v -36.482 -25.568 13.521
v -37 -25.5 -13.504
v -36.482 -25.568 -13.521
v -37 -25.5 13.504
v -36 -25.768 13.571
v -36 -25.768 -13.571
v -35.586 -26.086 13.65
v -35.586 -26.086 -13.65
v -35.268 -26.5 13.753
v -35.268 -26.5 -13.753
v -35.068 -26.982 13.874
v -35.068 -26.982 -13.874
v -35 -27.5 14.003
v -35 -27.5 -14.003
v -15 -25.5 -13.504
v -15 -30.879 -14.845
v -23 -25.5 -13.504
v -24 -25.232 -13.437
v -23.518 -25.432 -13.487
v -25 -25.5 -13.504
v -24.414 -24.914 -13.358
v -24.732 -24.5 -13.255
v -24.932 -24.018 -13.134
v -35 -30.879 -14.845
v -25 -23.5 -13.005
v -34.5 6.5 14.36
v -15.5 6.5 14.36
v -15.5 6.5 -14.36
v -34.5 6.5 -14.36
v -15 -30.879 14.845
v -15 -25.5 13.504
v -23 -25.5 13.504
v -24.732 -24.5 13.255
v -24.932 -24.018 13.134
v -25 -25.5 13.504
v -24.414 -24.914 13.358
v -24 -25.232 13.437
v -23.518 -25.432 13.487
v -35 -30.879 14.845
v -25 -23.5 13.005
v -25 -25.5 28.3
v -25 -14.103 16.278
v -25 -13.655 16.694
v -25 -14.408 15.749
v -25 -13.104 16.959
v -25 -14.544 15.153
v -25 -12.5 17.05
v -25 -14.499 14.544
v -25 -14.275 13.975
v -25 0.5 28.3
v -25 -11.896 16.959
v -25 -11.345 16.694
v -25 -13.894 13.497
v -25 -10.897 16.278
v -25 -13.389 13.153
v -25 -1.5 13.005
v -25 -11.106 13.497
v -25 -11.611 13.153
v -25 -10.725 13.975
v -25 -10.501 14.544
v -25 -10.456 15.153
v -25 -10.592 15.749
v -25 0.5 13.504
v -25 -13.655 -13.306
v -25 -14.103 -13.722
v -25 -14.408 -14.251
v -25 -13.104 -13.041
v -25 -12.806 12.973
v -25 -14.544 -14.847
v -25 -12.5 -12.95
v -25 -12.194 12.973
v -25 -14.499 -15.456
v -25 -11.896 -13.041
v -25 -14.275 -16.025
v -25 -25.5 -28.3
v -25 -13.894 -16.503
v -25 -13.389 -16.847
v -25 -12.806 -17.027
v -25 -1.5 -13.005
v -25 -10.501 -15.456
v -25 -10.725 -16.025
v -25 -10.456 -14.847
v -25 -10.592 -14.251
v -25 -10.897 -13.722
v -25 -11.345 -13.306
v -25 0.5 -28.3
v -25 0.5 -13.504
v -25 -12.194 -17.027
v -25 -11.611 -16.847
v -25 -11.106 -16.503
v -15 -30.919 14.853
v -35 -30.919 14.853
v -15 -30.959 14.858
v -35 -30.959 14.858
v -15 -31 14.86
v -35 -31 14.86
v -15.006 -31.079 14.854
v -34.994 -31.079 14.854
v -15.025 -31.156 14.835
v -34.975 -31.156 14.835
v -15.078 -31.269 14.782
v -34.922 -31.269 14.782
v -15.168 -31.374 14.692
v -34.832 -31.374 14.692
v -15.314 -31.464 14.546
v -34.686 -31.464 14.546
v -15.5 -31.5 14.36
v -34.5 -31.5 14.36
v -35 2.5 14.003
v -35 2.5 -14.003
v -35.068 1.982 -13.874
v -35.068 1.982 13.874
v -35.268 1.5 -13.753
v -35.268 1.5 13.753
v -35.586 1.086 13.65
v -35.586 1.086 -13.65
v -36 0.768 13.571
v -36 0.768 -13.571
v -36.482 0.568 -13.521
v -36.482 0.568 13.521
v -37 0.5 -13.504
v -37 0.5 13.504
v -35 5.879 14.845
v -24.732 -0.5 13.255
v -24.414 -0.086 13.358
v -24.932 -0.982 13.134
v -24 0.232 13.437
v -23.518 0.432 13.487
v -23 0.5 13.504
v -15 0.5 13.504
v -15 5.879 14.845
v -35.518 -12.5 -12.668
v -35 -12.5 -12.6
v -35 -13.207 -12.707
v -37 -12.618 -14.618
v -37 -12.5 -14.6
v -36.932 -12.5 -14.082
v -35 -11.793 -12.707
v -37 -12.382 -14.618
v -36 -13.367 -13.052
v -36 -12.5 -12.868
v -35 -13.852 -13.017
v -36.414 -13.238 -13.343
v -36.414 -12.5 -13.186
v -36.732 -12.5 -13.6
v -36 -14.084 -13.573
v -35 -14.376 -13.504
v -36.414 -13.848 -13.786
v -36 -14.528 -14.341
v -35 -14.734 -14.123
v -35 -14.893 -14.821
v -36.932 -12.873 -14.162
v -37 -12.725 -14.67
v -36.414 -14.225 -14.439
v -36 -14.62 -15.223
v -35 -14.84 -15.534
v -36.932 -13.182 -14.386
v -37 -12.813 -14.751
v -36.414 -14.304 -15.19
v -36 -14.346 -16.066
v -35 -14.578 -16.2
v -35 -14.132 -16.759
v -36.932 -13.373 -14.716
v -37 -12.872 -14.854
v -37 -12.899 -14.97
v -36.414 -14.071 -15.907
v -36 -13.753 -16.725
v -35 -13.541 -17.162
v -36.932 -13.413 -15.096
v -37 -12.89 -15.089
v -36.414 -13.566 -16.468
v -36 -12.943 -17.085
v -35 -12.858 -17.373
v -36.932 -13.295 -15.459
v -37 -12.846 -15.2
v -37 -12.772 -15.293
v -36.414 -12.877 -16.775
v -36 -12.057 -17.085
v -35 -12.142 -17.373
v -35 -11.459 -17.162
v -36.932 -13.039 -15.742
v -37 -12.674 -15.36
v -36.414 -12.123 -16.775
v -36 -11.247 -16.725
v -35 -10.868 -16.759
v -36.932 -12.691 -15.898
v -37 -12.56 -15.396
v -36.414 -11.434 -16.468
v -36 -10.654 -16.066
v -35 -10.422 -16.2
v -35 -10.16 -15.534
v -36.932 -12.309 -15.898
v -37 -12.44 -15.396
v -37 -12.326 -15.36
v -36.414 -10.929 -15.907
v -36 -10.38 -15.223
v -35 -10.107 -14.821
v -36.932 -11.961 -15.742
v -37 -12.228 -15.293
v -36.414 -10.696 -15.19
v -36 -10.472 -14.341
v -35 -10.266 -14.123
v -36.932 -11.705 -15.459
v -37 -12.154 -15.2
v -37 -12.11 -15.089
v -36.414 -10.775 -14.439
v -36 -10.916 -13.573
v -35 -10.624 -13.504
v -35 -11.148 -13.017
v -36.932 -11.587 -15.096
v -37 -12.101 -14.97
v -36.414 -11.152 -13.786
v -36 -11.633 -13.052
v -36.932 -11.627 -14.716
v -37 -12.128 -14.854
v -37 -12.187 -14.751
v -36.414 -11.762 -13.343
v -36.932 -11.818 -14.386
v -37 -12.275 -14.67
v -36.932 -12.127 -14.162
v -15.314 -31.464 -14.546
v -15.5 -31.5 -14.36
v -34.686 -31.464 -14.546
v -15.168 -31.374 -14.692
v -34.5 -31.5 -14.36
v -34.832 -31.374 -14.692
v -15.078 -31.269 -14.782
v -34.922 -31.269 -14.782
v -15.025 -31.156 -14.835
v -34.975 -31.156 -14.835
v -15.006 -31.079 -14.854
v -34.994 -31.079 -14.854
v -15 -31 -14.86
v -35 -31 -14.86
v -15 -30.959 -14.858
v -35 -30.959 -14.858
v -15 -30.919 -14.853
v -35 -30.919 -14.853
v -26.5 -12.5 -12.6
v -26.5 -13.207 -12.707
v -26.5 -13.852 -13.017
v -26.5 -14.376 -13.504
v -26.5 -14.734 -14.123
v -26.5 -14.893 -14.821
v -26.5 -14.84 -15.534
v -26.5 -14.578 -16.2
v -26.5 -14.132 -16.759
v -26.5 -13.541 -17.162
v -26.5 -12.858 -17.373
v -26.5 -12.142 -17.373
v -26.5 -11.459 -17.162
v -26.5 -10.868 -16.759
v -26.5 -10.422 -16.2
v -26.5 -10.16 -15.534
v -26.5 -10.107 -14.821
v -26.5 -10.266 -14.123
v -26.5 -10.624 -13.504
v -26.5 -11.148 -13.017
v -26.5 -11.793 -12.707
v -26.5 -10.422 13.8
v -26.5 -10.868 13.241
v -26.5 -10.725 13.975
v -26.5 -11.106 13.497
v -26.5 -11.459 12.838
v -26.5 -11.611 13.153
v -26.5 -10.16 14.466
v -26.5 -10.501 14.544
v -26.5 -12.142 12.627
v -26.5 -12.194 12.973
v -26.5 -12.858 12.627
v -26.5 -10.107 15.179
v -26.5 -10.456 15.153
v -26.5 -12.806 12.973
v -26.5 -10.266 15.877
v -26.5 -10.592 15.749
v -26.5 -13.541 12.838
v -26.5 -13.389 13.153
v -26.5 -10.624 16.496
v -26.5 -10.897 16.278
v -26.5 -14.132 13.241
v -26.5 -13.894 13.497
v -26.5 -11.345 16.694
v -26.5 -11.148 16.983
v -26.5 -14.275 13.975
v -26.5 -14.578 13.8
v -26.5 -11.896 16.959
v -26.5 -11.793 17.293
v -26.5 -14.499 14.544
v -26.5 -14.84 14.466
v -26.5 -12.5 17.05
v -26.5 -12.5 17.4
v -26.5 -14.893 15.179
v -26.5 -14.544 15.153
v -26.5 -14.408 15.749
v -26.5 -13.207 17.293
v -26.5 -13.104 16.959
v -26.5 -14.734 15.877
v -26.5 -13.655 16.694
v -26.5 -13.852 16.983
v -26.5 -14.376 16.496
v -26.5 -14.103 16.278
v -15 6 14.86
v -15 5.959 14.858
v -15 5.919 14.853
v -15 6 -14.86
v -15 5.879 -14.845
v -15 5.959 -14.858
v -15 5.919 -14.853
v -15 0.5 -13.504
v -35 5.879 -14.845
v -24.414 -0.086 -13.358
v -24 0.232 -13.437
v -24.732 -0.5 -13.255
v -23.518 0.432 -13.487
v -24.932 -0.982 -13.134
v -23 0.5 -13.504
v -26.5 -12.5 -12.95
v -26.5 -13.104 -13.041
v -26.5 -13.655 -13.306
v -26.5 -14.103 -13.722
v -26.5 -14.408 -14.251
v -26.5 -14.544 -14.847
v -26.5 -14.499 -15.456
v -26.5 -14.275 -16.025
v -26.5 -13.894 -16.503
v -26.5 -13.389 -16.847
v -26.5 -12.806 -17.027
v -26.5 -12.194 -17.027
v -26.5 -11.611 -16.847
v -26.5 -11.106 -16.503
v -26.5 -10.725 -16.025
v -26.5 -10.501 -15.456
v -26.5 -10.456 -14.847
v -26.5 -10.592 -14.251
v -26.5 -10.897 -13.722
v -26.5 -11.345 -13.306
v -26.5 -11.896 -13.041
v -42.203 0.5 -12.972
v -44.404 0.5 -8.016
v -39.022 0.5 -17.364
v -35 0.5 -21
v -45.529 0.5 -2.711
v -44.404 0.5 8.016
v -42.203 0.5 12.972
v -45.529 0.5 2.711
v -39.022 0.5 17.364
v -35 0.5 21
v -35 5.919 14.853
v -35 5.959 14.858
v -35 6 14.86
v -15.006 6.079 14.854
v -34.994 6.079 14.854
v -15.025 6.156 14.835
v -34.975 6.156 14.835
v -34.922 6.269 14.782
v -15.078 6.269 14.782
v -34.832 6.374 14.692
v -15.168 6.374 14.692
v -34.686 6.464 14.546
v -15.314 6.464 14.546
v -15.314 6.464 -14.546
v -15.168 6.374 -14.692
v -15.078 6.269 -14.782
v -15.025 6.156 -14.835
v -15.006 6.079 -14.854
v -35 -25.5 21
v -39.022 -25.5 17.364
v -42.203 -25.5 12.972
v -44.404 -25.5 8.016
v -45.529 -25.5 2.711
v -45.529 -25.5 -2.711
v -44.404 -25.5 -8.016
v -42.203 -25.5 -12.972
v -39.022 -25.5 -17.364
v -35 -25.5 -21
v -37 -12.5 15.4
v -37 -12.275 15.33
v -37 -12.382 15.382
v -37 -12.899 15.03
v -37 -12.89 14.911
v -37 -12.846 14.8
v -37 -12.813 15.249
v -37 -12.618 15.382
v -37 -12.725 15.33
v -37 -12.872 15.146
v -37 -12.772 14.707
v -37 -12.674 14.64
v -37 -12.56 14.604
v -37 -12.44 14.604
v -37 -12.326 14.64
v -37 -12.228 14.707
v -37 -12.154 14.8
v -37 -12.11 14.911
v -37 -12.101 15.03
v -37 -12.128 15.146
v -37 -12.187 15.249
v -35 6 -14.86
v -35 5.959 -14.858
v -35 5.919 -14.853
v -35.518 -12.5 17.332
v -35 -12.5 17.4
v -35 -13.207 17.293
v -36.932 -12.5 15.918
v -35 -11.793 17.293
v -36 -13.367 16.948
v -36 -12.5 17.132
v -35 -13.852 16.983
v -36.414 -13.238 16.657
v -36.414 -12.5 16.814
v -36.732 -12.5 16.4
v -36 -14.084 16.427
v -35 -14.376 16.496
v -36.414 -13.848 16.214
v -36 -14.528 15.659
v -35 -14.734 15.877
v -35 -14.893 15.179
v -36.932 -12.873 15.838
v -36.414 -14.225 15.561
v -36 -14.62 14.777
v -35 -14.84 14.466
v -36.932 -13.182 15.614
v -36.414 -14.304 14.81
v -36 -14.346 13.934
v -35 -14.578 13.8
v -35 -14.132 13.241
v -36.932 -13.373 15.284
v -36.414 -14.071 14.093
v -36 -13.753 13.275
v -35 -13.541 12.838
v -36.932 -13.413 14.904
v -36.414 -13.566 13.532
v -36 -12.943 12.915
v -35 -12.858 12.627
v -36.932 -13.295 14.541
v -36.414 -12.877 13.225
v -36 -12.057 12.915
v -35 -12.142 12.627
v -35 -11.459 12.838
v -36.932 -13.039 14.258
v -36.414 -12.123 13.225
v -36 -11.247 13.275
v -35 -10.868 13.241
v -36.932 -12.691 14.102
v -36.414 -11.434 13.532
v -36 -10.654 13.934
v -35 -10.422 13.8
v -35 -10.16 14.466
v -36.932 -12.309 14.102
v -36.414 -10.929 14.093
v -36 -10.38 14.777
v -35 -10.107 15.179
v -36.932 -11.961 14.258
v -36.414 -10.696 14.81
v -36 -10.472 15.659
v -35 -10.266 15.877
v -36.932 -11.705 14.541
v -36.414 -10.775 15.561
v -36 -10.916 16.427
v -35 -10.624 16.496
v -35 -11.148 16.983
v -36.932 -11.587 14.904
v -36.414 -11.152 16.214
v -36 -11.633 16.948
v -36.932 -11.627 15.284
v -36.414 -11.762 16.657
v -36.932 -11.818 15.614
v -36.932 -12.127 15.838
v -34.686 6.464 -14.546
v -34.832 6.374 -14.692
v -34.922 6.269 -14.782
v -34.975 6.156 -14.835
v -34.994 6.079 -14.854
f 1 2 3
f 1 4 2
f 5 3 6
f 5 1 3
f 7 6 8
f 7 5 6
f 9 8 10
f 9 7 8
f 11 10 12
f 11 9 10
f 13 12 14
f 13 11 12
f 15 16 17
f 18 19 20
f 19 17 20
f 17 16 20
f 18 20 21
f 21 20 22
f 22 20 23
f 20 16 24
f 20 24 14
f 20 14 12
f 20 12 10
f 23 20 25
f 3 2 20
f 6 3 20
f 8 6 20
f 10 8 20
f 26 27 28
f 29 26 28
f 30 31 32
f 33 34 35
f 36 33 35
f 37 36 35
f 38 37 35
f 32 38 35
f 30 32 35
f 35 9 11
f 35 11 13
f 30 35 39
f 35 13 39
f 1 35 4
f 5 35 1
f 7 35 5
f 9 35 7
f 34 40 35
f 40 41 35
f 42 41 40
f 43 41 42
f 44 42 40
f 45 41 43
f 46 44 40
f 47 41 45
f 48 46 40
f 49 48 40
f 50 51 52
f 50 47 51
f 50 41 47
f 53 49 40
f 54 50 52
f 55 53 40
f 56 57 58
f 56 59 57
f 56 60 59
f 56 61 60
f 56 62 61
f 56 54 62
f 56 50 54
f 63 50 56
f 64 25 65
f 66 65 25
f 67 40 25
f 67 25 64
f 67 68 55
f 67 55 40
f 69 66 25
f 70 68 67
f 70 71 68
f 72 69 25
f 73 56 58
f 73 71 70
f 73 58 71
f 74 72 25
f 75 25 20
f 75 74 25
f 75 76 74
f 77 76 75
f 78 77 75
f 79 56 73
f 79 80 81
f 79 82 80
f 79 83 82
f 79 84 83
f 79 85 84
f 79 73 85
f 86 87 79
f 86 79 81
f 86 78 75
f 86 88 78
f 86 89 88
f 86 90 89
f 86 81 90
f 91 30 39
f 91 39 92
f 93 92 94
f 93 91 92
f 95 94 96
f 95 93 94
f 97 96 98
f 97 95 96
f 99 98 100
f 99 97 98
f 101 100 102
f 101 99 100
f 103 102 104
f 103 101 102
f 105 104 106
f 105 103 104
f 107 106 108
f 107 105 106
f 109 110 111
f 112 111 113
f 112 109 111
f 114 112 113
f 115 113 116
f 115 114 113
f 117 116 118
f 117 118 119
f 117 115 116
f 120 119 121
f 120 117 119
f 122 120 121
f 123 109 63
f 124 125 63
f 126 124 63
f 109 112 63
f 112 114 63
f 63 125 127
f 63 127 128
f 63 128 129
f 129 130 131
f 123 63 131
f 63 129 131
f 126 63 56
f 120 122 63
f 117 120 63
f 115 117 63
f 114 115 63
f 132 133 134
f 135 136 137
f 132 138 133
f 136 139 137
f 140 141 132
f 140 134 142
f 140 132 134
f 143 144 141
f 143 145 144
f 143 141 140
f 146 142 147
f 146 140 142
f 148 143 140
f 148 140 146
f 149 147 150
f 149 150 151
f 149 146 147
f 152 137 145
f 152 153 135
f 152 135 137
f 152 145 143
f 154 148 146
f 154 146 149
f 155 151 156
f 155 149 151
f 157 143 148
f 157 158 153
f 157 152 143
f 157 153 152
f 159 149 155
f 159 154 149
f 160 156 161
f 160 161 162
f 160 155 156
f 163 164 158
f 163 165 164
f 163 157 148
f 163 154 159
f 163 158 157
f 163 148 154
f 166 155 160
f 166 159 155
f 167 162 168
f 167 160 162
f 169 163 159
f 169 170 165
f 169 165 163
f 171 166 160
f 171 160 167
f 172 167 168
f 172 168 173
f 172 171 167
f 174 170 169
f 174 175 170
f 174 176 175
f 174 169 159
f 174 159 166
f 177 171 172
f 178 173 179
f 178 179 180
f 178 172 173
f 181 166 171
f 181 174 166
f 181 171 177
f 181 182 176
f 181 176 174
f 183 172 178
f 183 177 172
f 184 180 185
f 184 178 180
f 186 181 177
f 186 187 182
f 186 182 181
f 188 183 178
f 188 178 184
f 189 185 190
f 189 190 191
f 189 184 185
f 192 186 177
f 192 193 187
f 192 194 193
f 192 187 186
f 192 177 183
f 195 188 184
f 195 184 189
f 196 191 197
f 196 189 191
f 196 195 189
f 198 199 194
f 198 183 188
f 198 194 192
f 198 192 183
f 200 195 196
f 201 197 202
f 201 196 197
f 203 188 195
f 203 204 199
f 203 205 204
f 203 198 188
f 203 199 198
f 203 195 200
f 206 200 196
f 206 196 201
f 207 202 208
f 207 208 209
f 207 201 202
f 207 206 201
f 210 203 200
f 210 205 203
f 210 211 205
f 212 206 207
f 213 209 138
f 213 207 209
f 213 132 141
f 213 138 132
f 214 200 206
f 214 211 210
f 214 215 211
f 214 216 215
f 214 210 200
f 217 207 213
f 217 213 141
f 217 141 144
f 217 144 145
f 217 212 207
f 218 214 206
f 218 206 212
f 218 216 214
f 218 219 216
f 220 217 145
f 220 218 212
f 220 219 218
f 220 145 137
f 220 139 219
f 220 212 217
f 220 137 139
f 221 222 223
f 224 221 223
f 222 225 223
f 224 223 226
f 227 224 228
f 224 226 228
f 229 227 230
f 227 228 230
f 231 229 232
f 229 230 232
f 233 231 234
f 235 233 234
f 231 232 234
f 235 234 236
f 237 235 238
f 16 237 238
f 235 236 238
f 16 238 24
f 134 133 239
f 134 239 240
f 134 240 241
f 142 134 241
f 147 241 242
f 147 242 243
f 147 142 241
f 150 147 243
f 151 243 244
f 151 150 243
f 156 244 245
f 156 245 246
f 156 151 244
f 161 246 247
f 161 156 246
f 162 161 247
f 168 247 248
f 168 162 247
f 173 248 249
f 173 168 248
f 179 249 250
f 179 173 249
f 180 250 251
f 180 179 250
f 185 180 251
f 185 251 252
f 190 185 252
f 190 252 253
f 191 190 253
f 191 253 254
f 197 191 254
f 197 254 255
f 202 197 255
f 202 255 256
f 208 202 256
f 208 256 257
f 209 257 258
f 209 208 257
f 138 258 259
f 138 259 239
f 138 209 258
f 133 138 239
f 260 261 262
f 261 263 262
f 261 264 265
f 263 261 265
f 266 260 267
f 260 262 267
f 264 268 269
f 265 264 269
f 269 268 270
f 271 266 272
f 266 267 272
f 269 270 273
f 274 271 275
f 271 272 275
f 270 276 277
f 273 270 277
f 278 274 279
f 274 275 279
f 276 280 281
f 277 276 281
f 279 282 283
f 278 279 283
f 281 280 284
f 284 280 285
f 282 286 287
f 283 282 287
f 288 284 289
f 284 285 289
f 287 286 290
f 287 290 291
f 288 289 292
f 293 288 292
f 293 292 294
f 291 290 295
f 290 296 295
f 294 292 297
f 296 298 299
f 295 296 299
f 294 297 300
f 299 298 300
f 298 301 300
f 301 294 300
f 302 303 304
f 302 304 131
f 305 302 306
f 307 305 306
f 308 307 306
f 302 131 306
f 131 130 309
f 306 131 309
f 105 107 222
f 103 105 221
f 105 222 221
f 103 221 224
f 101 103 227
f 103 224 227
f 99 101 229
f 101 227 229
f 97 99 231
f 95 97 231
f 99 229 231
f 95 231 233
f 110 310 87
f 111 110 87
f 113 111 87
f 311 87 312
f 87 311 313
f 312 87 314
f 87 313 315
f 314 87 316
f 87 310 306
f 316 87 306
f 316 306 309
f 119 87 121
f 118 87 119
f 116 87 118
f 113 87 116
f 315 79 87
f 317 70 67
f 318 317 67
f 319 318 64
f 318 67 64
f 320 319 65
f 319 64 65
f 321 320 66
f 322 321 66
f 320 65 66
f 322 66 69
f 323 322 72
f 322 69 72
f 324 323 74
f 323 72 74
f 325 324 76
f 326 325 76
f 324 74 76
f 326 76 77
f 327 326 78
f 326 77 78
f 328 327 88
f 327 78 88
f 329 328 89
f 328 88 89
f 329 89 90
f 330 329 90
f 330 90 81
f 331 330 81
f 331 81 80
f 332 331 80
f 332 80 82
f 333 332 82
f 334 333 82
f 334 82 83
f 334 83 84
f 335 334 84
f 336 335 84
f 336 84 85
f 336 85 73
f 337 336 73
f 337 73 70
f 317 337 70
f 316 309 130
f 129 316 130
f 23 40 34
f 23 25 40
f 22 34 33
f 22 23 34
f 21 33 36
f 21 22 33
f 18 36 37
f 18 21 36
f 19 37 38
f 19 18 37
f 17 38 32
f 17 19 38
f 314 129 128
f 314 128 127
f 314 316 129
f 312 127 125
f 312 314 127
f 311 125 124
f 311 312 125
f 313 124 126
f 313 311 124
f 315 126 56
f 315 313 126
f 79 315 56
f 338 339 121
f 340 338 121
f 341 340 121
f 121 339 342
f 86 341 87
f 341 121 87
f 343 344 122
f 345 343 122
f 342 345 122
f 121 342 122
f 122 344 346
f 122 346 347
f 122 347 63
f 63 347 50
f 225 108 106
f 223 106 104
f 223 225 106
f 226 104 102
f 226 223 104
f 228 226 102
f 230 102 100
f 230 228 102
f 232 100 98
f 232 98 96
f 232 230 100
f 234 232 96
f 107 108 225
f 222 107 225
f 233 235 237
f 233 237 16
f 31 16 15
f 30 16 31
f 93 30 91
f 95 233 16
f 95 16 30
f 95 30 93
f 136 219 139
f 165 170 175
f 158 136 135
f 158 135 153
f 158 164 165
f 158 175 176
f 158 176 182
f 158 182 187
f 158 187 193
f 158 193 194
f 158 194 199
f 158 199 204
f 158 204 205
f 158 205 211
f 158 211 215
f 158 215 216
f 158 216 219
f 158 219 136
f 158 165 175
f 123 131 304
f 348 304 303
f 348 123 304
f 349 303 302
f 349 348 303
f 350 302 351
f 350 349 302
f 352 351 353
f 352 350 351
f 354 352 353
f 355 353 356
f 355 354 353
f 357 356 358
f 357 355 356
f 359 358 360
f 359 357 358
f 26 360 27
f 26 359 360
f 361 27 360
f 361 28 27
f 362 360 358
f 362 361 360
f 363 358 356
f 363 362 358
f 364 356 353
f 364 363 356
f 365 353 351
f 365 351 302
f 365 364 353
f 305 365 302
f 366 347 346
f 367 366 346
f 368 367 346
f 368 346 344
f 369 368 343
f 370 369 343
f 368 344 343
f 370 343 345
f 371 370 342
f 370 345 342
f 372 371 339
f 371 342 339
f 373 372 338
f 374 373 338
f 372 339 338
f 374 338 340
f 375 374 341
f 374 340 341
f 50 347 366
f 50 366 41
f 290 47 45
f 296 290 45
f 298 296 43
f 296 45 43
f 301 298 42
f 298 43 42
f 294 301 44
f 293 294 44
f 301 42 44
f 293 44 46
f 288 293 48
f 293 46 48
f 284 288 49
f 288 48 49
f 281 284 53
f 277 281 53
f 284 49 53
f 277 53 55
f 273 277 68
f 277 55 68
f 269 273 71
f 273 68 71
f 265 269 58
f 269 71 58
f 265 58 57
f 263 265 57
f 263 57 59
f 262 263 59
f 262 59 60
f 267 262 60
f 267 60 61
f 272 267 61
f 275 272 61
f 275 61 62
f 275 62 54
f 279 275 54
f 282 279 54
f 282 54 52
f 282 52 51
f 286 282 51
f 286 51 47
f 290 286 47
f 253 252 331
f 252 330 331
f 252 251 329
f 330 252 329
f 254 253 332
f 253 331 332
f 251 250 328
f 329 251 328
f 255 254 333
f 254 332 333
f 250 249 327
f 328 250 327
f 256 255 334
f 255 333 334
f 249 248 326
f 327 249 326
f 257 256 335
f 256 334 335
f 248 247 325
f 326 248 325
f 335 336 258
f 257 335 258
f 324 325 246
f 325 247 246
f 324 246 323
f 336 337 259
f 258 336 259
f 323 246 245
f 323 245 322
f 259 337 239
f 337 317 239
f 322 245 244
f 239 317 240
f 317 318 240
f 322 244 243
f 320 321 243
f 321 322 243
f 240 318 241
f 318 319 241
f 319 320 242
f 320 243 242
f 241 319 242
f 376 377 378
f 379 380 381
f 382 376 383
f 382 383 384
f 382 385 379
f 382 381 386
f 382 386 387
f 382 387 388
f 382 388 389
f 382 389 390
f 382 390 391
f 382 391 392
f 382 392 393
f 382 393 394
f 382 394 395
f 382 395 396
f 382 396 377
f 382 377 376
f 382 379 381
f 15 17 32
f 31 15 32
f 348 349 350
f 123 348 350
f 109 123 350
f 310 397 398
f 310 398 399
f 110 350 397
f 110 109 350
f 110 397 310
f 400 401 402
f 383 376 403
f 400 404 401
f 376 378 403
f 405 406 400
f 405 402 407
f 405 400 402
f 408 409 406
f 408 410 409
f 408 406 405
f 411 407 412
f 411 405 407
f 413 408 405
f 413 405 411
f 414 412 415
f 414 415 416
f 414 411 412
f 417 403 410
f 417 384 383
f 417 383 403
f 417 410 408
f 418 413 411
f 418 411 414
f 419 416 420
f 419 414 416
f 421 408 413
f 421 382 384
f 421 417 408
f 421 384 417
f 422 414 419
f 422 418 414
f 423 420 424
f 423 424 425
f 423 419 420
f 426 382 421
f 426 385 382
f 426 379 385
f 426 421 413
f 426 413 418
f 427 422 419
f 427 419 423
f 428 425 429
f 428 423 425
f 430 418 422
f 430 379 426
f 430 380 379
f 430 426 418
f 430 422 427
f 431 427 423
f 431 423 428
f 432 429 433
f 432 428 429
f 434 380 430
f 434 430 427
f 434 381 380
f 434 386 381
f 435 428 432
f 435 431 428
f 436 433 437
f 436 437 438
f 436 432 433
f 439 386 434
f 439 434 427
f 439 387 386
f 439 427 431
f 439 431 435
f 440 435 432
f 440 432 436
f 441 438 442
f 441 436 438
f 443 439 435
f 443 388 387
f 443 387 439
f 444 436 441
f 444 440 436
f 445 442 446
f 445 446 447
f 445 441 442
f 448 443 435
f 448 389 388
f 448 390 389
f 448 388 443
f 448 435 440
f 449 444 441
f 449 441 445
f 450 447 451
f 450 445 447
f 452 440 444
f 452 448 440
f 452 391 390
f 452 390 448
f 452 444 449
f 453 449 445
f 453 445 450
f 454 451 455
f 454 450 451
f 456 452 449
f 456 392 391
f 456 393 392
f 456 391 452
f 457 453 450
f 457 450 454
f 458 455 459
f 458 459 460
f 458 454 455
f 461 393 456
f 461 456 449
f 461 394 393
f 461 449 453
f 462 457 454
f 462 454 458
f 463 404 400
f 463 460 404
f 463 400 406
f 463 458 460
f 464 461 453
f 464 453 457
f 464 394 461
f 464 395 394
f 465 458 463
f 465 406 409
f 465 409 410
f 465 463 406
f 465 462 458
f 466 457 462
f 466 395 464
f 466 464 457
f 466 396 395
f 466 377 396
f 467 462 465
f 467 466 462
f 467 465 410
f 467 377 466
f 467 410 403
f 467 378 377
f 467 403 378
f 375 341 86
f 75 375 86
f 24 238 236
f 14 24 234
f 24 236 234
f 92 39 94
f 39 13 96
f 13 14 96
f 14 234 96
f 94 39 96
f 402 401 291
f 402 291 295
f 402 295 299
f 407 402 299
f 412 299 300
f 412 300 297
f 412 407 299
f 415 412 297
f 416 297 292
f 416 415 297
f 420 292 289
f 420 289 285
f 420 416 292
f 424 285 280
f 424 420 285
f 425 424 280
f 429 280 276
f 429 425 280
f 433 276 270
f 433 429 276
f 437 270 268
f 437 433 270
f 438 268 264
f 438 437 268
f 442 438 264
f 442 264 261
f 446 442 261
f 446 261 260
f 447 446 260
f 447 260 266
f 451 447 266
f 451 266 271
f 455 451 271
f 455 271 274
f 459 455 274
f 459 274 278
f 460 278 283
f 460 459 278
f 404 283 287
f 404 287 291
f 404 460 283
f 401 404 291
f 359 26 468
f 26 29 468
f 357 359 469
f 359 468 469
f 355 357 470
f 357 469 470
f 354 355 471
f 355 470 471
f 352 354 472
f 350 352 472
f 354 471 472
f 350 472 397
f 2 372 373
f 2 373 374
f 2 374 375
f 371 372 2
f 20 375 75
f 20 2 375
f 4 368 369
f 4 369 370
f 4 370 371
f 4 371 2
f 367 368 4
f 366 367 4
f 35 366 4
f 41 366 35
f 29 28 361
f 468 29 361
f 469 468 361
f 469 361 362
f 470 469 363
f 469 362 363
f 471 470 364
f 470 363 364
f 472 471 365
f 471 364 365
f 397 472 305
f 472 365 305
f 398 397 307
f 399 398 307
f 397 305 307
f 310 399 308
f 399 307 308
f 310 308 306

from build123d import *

# Parameters (mm, degrees)
PAD001_DEPTH    = 26
SKETCH003_R     = 2.05
POCKET_DEPTH    = 12
SKETCH005_R     = 2.4
POCKET001_DEPTH = 10.5
PAD004_DEPTH    = 10
FILLET006_R     = 2
FILLET007_R     = 0.5
FILLET008_R     = 2


with BuildPart() as part:
    # Sketch001 → Pad001 (new body)
    with BuildSketch(Plane.XZ):
        with BuildLine():
            ThreePointArc((-35, 21), (-45.67029, 0), (-35, -21))
            Line((-35, -21), (-25, -28.299822))
            Line((-25, 28.299822), (-25, -28.299822))
            Line((-35, 21), (-25, 28.299822))
        make_face()
    extrude(amount=PAD001_DEPTH)

    # Sketch003 (on Face3 of Pad001) → Pocket (cut)
    with BuildSketch(Plane(origin=(-25, 0, 0), x_dir=(0, 0, 1), z_dir=(1, 0, 0))):
        with Locations((-15, 13)):
            Circle(SKETCH003_R)
        with Locations((15, 13)):
            Circle(SKETCH003_R)
    extrude(amount=-POCKET_DEPTH, mode=Mode.SUBTRACT)

    # Sketch005 (on Face9 of Pocket) → Pocket001 (cut)
    with BuildSketch(Plane(origin=(-37, 0, 0), x_dir=(0, 0, 1), z_dir=(1, 0, 0))):
        with Locations((-15, 13)):
            Circle(SKETCH005_R)
        with Locations((15, 13)):
            Circle(SKETCH005_R)
    extrude(amount=POCKET001_DEPTH, mode=Mode.SUBTRACT)

    # Sketch006 (on Face6 of Pocket001) → Pad004 (join, symmetric)
    with BuildSketch(Plane(origin=(-25, 0, 0), x_dir=(0, 0, 1), z_dir=(1, 0, 0))):
        Polygon((-13.504032, 26), (13.504032, 26), (15, 32), (-15, 32), align=None)
        Polygon((-13.504032, 0), (13.504032, 0), (15, -6), (-15, -6), align=None)
    extrude(amount=PAD004_DEPTH, both=True)

    # Fillet006
    fillet006_edges = [part.edges().sort_by_distance(p)[0] for p in [
        (-25, -26, 0),
        (-25, 0, 0),
        (-35, 0, 0),
        (-35, -26, 0),
    ]]
    fillet(fillet006_edges, radius=FILLET006_R)

    # Fillet007
    fillet007_edges = [part.edges().sort_by_distance(p)[0] for p in [
        (-15, 6, 0),
        (-25, 6, -15),
        (-35, 6, 0),
        (-25, 6, 15),
        (-25, -32, 15),
        (-15, -32, 0),
        (-25, -32, -15),
        (-35, -32, 0),
    ]]
    fillet(fillet007_edges, radius=FILLET007_R)

    # Fillet008
    fillet008_edges = [part.edges().sort_by_distance(p)[0] for p in [
        (-37, -13, 12.6),
        (-37, -13, -17.4),
    ]]
    fillet(fillet008_edges, radius=FILLET008_R)


with BuildPart() as part_1:
    # Body001 placement: moved
    add(part.part.moved(Location((0, 0.5, 0))))


solid = part_1.part
